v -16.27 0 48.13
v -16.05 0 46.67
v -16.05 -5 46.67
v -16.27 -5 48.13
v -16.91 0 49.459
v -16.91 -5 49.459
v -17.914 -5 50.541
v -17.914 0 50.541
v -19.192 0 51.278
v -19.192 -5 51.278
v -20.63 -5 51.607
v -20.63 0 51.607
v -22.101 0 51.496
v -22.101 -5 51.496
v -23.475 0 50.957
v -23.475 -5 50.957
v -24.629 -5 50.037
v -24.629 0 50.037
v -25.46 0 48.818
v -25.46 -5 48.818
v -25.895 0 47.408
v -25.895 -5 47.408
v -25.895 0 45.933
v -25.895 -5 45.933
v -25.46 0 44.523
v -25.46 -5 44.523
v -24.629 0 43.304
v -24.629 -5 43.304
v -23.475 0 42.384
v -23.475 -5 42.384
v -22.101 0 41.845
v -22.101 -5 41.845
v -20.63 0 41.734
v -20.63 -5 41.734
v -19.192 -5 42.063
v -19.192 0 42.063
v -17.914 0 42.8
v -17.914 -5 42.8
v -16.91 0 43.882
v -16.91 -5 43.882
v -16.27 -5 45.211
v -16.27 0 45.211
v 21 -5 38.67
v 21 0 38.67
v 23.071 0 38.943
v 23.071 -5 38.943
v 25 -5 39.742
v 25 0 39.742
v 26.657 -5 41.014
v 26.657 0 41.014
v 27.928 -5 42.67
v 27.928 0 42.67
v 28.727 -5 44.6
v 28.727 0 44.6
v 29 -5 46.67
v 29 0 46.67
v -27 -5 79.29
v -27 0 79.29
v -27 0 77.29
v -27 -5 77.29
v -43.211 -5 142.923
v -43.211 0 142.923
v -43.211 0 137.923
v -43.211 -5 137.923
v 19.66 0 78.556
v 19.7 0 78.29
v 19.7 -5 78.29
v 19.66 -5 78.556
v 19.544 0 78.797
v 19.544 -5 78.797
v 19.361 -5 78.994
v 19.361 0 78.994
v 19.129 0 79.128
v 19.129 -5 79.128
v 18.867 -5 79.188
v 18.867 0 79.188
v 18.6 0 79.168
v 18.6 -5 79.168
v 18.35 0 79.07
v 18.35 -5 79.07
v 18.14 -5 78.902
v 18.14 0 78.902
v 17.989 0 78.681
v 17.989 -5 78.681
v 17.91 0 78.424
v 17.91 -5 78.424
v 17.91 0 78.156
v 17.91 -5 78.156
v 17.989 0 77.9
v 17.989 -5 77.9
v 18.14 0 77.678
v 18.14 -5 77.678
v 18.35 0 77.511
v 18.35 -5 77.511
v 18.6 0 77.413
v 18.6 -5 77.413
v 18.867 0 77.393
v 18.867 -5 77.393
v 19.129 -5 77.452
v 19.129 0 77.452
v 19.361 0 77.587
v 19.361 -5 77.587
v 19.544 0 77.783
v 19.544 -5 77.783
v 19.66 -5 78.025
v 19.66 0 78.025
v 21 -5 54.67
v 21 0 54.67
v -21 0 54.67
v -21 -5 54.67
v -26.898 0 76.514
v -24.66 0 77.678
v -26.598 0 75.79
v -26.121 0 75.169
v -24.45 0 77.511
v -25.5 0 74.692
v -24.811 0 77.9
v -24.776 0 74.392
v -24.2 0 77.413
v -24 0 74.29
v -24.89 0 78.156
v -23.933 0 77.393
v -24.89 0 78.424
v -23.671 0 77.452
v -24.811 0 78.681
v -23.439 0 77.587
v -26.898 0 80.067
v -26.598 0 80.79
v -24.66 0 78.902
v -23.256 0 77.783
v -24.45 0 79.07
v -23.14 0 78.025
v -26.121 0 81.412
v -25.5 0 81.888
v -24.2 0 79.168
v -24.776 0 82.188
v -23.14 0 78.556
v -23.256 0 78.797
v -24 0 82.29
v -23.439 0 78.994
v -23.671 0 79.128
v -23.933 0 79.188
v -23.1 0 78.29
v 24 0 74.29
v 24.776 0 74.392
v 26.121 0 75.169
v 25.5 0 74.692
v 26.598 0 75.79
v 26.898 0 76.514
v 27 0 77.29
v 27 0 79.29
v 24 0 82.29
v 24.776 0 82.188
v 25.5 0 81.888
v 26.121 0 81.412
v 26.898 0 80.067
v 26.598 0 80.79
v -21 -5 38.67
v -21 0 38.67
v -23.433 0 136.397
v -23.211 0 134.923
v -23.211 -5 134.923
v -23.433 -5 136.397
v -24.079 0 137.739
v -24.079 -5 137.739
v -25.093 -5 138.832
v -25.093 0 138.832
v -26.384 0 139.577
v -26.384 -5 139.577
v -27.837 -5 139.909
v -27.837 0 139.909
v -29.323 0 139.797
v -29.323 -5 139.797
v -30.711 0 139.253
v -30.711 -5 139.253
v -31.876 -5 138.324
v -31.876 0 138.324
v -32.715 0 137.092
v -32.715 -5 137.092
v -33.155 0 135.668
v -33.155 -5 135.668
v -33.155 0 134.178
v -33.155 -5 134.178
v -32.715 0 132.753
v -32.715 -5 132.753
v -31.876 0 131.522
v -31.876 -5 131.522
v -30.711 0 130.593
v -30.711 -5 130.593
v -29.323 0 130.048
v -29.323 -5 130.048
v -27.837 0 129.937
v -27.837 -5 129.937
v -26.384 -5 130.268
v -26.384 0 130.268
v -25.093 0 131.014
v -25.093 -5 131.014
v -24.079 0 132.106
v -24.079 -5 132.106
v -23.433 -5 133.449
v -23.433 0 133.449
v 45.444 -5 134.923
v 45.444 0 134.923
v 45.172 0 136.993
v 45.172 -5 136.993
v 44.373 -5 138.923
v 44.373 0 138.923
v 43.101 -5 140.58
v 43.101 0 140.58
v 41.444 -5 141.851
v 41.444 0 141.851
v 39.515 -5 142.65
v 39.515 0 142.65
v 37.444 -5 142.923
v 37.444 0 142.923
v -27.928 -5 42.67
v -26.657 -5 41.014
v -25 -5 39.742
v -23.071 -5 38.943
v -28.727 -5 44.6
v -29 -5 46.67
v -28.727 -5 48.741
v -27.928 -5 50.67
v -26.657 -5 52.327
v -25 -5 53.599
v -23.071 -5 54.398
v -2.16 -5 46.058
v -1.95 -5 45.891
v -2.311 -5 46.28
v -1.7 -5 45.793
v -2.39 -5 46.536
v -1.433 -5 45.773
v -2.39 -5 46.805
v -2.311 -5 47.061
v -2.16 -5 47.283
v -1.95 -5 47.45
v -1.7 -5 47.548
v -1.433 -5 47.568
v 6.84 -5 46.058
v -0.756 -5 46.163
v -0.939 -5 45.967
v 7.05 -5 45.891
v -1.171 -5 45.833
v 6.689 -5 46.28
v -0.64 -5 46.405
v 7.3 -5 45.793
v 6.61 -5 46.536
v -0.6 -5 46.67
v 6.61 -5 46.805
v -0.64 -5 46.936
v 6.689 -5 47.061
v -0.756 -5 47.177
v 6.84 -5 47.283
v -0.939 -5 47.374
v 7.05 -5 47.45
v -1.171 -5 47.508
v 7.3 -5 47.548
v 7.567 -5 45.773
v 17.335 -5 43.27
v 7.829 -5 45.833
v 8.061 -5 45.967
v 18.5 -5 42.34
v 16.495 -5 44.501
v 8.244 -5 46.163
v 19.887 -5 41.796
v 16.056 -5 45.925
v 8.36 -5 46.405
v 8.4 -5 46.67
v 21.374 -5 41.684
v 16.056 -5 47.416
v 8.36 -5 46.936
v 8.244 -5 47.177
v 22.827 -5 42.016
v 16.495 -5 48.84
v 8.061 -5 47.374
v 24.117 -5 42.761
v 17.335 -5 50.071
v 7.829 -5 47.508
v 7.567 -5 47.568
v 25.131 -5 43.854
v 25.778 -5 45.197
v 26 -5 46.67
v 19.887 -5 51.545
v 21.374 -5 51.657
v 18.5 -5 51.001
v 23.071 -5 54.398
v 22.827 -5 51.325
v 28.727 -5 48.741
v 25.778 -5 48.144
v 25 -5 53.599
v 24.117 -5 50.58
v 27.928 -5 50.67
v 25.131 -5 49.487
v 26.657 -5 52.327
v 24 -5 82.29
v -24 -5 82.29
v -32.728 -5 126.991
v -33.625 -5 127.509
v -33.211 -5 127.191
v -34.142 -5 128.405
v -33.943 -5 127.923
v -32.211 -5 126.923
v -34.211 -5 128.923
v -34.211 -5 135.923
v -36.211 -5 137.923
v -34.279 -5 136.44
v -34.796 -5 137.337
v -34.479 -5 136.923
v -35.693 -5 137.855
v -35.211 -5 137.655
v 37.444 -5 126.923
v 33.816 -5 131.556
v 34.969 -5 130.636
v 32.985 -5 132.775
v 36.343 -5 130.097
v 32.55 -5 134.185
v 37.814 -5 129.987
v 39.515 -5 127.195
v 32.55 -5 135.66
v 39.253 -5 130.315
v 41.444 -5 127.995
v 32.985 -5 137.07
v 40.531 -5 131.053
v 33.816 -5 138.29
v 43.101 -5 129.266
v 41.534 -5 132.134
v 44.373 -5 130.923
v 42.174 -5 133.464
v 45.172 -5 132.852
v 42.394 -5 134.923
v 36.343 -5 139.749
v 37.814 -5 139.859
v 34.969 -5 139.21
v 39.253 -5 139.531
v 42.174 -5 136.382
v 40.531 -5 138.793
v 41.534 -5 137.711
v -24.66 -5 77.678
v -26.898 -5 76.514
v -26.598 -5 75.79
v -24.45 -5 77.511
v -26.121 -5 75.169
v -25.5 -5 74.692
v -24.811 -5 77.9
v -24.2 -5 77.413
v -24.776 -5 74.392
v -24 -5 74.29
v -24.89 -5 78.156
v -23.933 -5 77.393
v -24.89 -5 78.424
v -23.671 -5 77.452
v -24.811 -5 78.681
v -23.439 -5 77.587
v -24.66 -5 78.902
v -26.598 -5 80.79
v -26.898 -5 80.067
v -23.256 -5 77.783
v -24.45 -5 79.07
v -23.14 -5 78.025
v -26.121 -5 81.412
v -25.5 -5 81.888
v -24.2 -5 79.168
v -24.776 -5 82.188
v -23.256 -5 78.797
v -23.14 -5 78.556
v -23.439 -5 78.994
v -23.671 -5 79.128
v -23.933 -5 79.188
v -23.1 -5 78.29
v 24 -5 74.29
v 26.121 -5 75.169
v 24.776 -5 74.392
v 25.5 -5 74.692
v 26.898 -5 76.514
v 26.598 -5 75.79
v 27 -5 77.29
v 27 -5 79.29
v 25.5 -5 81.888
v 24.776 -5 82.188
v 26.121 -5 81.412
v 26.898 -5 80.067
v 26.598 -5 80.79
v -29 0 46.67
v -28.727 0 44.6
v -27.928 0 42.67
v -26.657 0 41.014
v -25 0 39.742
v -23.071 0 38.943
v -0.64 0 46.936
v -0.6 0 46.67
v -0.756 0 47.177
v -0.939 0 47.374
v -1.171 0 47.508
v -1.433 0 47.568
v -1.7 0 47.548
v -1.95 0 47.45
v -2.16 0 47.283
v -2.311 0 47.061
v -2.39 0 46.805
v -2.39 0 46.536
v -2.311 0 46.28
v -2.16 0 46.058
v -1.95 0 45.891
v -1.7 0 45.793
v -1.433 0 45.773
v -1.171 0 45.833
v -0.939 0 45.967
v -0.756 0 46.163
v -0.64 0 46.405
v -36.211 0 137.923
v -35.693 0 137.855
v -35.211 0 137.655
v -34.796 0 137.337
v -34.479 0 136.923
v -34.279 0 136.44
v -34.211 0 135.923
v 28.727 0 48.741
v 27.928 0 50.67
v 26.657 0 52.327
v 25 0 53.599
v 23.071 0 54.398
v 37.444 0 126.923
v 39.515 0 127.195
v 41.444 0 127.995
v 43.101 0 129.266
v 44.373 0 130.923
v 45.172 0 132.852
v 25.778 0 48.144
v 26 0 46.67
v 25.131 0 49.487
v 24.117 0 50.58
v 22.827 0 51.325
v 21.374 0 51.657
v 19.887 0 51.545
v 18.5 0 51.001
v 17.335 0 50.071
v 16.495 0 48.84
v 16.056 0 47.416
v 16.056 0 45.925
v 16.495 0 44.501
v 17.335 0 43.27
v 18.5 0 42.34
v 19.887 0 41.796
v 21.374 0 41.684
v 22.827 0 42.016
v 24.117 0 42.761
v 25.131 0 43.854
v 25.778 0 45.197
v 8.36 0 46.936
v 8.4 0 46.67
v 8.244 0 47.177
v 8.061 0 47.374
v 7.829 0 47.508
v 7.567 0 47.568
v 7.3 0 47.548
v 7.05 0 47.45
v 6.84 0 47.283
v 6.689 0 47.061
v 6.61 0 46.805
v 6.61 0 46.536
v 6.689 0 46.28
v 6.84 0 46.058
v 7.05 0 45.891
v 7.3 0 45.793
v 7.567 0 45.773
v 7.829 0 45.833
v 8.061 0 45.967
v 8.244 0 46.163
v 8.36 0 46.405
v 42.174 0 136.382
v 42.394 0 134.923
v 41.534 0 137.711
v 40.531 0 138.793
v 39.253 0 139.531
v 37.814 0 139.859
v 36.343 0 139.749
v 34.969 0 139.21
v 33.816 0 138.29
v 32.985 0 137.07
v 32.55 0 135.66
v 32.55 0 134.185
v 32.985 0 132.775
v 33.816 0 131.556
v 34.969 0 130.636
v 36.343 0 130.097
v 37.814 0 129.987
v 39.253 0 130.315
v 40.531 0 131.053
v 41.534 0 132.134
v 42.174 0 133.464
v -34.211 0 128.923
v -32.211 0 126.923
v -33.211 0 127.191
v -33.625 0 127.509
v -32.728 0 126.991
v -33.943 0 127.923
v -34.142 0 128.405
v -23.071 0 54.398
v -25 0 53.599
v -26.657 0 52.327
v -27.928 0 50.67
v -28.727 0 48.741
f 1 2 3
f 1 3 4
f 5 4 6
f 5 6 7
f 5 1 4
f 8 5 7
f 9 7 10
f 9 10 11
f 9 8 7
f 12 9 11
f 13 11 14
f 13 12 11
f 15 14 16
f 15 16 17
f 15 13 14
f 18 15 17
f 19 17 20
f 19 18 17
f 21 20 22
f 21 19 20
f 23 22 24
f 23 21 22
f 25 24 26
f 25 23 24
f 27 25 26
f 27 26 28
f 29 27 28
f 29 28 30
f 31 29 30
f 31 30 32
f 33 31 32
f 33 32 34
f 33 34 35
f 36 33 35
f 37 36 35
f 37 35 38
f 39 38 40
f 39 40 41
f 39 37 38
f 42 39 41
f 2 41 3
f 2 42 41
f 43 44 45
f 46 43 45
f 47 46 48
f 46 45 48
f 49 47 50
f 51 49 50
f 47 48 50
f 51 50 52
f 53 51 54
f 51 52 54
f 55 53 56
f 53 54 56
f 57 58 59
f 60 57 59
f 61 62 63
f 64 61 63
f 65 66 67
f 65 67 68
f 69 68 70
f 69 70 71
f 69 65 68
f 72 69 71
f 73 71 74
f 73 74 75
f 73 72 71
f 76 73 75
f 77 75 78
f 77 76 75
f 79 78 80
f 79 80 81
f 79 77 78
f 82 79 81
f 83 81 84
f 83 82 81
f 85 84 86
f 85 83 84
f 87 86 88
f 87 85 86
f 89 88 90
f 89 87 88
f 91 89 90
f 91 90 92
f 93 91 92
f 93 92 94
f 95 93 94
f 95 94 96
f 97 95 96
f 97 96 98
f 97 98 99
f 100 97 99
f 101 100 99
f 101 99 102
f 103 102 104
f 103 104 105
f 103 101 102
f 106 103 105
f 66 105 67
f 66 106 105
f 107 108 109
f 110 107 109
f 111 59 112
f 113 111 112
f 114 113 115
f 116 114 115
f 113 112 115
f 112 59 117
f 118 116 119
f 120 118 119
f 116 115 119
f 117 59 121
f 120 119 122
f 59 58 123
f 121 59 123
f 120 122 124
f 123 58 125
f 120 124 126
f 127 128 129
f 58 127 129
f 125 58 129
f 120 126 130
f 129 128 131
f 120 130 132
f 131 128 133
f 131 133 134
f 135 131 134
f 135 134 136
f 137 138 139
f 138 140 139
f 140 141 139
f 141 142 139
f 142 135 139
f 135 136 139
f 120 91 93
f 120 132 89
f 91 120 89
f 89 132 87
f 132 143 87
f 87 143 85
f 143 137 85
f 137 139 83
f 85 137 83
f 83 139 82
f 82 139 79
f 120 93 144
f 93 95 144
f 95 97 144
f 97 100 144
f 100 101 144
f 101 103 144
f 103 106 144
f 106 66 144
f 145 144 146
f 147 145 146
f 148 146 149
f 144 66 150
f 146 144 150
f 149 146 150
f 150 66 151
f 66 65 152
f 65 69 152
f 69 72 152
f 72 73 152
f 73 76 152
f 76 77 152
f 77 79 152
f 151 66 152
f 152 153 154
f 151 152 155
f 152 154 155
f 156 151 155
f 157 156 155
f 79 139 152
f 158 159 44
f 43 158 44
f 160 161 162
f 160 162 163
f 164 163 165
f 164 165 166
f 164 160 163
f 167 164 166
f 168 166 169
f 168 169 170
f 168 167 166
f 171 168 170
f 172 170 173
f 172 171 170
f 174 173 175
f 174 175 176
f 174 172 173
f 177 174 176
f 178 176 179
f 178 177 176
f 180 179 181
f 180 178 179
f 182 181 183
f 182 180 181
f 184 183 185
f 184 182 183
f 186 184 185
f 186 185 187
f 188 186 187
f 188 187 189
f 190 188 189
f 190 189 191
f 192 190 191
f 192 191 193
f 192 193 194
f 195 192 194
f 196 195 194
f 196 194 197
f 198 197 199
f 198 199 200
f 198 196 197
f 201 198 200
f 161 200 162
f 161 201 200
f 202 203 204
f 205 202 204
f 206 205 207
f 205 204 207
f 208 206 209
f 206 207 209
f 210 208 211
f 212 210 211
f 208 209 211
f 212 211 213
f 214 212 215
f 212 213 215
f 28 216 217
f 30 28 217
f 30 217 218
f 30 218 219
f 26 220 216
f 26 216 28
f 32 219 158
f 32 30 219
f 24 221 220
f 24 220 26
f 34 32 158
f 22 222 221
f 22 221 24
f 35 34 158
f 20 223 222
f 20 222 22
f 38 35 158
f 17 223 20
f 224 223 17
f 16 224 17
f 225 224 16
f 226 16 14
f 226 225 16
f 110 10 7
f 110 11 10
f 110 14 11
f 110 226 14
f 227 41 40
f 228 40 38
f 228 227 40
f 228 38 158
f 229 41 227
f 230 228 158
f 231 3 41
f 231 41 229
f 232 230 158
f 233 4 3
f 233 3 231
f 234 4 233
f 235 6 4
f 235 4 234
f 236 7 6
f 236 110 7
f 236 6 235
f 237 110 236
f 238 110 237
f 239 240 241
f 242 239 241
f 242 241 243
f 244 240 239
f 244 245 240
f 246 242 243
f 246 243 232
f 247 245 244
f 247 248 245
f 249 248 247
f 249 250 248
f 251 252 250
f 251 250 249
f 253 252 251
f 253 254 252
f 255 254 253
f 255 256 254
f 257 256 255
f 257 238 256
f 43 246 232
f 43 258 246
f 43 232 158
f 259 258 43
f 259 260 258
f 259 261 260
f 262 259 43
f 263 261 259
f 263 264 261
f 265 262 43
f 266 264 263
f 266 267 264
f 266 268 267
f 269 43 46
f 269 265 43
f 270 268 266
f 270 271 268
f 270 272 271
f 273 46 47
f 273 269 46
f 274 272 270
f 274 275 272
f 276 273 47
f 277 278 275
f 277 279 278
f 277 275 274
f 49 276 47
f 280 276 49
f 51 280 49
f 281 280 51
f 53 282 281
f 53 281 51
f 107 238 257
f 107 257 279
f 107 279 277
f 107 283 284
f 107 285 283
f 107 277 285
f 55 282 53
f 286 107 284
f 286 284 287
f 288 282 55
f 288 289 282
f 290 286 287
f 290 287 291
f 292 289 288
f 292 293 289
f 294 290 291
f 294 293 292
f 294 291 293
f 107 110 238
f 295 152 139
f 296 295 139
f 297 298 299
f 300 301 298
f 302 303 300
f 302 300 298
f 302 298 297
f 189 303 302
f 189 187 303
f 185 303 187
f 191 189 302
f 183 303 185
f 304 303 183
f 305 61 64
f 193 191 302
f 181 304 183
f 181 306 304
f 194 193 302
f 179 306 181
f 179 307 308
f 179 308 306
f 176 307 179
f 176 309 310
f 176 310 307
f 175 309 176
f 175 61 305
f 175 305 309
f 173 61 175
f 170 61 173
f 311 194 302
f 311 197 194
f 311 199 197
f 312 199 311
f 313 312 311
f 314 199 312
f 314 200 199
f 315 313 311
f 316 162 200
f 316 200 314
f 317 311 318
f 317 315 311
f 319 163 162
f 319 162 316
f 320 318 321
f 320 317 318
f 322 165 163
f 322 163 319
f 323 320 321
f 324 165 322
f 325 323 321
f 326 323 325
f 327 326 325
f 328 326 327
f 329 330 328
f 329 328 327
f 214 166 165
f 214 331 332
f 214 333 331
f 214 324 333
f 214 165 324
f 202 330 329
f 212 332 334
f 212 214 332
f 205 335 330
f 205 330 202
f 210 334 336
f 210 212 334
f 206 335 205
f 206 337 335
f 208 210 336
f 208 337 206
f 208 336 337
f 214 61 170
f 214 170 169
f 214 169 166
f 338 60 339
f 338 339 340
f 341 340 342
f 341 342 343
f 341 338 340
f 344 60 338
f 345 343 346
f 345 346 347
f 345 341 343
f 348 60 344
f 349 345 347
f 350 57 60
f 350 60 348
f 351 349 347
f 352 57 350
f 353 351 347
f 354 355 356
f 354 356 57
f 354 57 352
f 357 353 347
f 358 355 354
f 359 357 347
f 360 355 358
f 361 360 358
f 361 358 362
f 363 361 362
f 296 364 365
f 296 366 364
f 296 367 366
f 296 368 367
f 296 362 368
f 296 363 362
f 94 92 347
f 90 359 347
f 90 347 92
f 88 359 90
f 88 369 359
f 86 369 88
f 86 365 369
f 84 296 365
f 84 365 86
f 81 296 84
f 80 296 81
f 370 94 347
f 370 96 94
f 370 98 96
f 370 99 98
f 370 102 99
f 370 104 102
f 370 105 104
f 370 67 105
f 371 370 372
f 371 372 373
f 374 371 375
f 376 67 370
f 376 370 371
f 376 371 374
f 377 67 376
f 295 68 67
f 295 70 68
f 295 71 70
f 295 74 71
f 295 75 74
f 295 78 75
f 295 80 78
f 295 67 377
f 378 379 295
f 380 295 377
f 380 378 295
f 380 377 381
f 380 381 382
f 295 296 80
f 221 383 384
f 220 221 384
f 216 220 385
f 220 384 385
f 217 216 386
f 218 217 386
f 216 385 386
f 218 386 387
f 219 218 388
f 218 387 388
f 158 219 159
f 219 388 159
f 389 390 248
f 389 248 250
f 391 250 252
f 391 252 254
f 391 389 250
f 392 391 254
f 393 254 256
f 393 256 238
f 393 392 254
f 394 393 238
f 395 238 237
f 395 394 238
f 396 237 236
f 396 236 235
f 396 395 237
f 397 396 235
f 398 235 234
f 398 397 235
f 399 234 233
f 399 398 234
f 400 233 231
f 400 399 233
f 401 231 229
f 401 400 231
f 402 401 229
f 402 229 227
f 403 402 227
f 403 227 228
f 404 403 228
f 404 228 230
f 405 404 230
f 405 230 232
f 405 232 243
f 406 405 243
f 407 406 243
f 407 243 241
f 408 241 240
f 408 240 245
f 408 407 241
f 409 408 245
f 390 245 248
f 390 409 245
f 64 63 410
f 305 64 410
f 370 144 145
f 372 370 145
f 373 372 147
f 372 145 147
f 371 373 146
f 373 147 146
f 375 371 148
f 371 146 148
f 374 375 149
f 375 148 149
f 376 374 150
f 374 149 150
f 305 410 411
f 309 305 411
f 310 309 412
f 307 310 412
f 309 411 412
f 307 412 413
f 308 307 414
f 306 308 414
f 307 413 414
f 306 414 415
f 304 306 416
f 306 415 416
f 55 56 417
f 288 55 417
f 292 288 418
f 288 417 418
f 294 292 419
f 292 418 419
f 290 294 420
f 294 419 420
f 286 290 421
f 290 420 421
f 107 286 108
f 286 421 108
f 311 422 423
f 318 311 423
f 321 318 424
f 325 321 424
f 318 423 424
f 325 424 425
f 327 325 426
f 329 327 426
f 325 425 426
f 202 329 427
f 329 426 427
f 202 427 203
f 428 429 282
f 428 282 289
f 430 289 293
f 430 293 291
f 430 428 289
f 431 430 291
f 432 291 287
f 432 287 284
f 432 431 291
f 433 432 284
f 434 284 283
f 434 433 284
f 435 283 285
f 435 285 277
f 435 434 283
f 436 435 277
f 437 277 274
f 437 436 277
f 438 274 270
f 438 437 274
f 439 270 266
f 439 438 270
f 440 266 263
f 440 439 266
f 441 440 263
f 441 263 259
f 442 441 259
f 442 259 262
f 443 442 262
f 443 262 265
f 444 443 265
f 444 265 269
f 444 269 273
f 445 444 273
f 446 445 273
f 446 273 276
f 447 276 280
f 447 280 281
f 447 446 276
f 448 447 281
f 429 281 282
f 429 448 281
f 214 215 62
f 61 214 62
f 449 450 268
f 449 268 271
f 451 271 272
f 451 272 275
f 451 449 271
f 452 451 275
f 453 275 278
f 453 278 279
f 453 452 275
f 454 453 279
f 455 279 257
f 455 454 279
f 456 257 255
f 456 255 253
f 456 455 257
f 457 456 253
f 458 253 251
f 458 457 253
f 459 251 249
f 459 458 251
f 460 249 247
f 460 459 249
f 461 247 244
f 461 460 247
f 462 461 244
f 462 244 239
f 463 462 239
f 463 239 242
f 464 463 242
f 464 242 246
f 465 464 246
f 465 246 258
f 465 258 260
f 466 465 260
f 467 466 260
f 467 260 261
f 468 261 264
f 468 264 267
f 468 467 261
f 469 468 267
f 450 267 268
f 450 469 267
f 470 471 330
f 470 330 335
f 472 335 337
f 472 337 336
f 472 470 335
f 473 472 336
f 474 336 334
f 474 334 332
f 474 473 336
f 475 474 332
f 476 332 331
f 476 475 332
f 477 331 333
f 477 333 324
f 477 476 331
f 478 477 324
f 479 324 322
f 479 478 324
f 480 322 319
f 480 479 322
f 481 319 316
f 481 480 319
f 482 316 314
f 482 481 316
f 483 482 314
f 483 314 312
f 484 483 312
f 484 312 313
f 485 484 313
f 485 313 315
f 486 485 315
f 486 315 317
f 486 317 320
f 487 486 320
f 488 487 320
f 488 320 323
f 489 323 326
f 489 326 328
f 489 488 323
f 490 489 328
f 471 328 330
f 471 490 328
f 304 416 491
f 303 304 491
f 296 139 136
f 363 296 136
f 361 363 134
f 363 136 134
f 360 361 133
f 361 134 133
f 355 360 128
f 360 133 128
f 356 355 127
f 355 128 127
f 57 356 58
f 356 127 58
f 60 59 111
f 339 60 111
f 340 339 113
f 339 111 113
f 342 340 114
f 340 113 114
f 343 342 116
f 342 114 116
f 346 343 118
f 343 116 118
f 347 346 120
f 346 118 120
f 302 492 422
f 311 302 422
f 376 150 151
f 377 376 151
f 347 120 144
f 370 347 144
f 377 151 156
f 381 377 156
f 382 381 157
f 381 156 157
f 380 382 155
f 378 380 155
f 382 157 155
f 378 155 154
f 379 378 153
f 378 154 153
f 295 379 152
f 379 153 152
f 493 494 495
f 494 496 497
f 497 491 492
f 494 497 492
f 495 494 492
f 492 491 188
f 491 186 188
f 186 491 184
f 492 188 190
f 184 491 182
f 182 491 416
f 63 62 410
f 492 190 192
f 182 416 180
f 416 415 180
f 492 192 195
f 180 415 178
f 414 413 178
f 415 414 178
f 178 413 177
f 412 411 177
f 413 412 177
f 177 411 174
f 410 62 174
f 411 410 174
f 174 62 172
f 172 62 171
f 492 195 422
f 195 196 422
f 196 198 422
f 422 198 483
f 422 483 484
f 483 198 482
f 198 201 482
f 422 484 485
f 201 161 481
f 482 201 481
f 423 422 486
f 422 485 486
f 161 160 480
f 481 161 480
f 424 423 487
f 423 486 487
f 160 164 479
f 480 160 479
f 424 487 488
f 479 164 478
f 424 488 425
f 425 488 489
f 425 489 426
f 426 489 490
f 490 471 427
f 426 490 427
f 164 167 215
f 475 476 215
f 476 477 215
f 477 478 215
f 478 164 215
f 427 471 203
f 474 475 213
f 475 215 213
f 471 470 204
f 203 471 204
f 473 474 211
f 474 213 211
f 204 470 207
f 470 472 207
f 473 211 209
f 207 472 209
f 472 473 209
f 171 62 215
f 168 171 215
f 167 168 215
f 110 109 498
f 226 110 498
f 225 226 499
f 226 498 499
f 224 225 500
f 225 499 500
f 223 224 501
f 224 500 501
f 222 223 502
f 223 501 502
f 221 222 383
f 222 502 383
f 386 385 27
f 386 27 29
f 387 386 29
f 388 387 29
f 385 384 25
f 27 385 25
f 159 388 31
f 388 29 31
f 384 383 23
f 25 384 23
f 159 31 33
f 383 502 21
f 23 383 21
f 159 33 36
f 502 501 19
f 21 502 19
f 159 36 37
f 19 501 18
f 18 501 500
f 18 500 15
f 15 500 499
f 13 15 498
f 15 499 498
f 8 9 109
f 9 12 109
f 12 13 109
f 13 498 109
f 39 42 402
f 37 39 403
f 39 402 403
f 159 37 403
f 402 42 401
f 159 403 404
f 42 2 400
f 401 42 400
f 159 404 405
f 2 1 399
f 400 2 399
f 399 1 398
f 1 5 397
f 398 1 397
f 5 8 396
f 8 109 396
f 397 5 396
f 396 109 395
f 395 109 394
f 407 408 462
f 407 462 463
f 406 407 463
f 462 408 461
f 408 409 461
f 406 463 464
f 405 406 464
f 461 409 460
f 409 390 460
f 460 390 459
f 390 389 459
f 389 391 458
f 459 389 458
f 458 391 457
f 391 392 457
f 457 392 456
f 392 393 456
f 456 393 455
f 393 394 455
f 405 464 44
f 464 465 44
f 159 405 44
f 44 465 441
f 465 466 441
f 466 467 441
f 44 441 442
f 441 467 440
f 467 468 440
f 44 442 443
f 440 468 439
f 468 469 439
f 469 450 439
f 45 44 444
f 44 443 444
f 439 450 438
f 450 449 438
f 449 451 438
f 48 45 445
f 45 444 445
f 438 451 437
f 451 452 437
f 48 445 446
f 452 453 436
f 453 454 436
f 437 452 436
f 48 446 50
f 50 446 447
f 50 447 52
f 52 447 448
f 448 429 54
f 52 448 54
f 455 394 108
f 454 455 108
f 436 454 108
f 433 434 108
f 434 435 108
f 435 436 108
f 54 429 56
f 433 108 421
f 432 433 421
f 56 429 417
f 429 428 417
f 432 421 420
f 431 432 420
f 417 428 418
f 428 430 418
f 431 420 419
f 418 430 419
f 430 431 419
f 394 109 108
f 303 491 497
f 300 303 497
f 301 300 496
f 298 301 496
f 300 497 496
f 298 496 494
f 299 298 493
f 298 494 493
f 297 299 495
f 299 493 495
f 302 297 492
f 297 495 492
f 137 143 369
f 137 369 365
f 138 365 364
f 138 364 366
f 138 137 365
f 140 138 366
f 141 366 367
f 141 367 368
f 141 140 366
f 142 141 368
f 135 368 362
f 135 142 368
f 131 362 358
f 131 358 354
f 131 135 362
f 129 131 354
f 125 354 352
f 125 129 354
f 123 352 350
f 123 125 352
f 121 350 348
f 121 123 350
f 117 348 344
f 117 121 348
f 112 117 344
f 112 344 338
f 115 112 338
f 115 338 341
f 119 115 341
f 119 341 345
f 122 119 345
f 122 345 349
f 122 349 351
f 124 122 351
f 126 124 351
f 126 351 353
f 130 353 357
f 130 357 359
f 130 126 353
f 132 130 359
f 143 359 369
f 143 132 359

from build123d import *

# Parameters (mm, degrees)
F0_R     = 5
F0_R_2   = 4.95
F0_R_3   = 0.9
F1_DEPTH = 5


with BuildPart() as f1:
    # F0 (on Front) → F1 (new body)
    with BuildSketch(Plane.XZ):
        with BuildLine():
            Line((-32.210607, 126.922728), (37.444393, 126.922728))
            ThreePointArc((37.444393, 126.922728), (43.101247, 129.265874), (45.444393, 134.922728))
            ThreePointArc((45.444393, 134.922728), (43.101247, 140.579582), (37.444393, 142.922728))
            Line((37.444393, 142.922728), (-32.210607, 142.922728))
            Line((-32.210607, 142.922728), (-43.210607, 142.922728))
            Line((-43.210607, 142.922728), (-43.210607, 137.922728))
            Line((-43.210607, 137.922728), (-36.210607, 137.922728))
            ThreePointArc((-36.210607, 137.922728), (-34.796394, 137.336942), (-34.210607, 135.922728))
            Line((-34.210607, 135.922728), (-34.210607, 128.922728))
            ThreePointArc((-34.210607, 128.922728), (-33.624821, 127.508514), (-32.210607, 126.922728))
        make_face()
        with Locations((-28.210607, 134.922728)):
            Circle(F0_R, mode=Mode.SUBTRACT)
        with Locations((37.444393, 134.922728)):
            Circle(F0_R_2, mode=Mode.SUBTRACT)
        with BuildLine():
            Line((-24, 74.290269), (24, 74.290269))
            ThreePointArc((24, 74.290269), (26.12132, 75.168948), (27, 77.290269))
            Line((27, 77.290269), (27, 79.290269))
            ThreePointArc((27, 79.290269), (26.12132, 81.411589), (24, 82.290269))
            Line((24, 82.290269), (-24, 82.290269))
            ThreePointArc((-24, 82.290269), (-26.12132, 81.411589), (-27, 79.290269))
            Line((-27, 79.290269), (-27, 77.290269))
            ThreePointArc((-27, 77.290269), (-26.12132, 75.168948), (-24, 74.290269))
        make_face()
        with Locations((-24, 78.290269)):
            Circle(F0_R_3, mode=Mode.SUBTRACT)
        with Locations((18.8, 78.290269)):
            Circle(F0_R_3, mode=Mode.SUBTRACT)
        with BuildLine():
            Line((-21, 38.670482), (21, 38.670482))
            ThreePointArc((21, 38.670482), (26.656854, 41.013627), (29, 46.670482))
            ThreePointArc((29, 46.670482), (26.656854, 52.327336), (21, 54.670482))
            Line((21, 54.670482), (-21, 54.670482))
            ThreePointArc((-21, 54.670482), (-26.656854, 52.327336), (-29, 46.670482))
            ThreePointArc((-29, 46.670482), (-26.656854, 41.013627), (-21, 38.670482))
        make_face()
        with Locations((-21, 46.670482)):
            Circle(F0_R_2, mode=Mode.SUBTRACT)
        with Locations((-1.5, 46.670482)):
            Circle(F0_R_3, mode=Mode.SUBTRACT)
        with Locations((7.5, 46.670482)):
            Circle(F0_R_3, mode=Mode.SUBTRACT)
        with Locations((21, 46.670482)):
            Circle(F0_R, mode=Mode.SUBTRACT)
    extrude(amount=F1_DEPTH)


solid = f1.part
